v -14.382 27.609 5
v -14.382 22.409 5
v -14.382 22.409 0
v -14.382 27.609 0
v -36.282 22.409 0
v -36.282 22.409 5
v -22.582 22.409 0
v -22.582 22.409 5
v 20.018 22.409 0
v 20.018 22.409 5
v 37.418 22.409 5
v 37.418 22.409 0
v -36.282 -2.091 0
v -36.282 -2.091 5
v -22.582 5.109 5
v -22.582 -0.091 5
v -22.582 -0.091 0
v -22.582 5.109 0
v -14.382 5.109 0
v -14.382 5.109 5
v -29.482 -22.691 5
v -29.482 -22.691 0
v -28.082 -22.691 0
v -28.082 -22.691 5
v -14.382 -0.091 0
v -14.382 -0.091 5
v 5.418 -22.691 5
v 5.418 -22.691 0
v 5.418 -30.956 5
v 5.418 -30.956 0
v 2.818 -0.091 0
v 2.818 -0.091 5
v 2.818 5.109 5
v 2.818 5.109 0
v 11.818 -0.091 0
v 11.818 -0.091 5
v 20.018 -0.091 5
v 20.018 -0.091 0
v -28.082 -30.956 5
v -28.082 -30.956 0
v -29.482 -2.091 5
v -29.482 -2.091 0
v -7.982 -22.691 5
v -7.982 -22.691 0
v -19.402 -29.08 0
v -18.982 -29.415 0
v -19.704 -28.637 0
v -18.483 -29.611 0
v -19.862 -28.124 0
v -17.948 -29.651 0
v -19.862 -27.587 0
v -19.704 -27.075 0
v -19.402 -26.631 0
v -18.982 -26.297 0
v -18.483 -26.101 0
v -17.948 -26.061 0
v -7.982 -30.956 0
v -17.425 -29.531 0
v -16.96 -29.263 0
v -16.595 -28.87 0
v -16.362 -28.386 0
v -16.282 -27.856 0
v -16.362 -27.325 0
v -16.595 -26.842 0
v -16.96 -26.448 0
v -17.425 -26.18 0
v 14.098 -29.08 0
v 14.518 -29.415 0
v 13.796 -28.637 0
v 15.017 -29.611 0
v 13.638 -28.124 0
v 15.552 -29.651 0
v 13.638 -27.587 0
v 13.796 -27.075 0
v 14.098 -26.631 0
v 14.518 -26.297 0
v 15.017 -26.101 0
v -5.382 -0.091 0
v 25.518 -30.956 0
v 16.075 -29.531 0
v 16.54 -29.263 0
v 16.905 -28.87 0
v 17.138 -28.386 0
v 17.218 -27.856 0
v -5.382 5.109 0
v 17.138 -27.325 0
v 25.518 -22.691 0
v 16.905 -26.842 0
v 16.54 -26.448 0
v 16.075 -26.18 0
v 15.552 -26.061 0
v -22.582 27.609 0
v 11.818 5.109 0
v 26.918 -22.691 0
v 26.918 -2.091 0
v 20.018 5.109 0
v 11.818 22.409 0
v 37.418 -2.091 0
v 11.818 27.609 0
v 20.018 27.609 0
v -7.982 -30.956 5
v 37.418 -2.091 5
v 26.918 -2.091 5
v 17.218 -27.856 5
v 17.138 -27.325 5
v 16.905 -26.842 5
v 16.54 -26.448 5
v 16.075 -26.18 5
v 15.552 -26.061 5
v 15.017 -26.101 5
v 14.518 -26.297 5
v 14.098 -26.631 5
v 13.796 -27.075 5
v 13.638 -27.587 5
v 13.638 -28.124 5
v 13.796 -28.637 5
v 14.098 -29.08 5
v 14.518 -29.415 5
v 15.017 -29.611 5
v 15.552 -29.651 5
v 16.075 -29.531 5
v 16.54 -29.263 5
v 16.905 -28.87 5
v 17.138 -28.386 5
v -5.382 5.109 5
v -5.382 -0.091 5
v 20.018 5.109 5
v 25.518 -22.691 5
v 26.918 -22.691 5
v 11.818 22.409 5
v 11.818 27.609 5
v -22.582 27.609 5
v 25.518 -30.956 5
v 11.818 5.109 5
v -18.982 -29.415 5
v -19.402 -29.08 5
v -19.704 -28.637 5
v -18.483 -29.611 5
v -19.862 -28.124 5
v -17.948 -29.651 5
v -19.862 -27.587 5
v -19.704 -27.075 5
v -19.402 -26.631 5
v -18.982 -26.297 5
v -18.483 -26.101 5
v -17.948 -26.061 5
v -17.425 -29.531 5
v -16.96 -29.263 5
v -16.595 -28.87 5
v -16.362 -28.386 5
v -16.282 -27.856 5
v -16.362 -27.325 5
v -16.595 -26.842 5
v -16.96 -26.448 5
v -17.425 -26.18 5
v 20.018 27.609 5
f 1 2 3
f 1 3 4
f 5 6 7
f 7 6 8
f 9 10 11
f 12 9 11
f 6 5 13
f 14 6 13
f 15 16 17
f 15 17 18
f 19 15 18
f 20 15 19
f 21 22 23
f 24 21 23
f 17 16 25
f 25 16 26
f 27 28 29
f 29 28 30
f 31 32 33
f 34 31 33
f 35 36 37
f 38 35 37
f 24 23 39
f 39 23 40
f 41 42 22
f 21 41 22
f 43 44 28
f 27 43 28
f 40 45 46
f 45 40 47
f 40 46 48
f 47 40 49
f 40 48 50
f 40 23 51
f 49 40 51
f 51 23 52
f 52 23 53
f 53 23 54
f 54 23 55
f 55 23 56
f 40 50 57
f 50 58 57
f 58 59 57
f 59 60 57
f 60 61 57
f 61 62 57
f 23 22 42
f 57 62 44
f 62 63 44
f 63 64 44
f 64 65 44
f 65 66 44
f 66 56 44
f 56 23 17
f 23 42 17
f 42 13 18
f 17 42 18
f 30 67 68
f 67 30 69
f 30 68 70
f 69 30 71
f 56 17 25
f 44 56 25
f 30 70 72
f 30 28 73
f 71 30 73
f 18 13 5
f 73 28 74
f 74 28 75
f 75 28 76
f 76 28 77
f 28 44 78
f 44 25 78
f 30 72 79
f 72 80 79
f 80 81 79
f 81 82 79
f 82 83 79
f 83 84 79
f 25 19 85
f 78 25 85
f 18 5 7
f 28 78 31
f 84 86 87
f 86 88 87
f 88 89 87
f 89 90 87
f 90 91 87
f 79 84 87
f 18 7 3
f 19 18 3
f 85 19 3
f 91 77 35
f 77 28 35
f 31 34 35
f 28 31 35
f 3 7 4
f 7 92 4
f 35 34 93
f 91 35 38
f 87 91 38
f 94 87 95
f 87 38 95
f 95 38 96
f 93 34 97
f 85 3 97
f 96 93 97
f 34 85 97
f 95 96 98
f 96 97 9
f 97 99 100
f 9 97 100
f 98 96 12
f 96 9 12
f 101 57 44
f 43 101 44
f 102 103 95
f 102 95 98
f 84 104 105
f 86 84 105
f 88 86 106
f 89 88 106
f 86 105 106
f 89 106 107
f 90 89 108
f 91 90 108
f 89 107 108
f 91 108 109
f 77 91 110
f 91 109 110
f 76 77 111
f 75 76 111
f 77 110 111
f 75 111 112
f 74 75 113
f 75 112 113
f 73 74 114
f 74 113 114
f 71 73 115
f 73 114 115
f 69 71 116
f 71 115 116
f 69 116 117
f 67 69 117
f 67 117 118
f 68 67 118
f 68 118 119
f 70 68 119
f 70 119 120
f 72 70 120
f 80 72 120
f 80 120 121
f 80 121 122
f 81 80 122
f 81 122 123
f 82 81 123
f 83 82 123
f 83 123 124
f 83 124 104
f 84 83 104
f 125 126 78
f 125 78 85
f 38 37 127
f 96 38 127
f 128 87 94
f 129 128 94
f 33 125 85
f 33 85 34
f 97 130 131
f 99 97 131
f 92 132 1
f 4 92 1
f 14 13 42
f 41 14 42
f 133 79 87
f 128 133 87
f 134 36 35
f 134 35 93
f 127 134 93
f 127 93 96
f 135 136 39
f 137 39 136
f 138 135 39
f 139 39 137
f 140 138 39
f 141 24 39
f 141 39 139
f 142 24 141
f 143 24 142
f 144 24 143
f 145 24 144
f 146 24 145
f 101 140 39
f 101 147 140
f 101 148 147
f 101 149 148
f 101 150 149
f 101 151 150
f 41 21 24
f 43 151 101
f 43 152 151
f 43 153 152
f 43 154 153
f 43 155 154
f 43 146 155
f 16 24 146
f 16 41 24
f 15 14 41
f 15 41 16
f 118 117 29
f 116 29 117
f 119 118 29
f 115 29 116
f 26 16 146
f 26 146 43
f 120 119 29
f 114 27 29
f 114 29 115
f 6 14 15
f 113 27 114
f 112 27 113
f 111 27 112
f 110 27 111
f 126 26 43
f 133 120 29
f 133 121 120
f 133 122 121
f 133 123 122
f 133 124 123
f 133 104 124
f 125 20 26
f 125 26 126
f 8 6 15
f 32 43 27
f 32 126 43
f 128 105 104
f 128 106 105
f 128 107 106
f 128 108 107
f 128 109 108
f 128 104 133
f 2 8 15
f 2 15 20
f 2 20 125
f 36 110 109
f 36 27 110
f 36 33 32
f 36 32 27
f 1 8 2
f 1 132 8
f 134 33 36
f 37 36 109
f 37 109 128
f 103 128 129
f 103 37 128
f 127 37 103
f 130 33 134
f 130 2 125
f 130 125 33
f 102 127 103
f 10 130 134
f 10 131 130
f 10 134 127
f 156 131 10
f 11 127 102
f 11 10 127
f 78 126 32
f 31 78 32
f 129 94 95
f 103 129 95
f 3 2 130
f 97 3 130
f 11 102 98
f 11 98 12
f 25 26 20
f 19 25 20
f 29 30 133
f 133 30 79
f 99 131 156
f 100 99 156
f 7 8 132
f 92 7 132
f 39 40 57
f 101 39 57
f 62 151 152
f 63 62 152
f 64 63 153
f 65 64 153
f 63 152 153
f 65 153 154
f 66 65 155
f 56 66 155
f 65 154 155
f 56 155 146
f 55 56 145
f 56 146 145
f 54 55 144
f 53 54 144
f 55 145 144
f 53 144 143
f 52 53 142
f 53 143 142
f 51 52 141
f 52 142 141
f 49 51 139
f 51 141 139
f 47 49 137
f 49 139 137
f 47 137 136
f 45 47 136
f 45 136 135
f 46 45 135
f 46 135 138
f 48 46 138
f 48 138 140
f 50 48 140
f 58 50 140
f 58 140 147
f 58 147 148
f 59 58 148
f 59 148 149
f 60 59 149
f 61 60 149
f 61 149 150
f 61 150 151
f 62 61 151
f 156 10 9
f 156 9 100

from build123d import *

# Parameters (mm, degrees)
BOSS_EXTRUDE1_DEPTH = 5
CUT_EXTRUDE1_REACH  = 7
SKETCH2_R           = 1.8
SKETCH2_W           = 8.2
SKETCH2_H           = 5.2
SKETCH3_W           = 3.7
SKETCH3_H           = 24.5
BOSS_EXTRUDE4_DEPTH = 5
SKETCH4_W           = 8.2
SKETCH4_H           = 5.2
BOSS_EXTRUDE7_DEPTH = 5


with BuildPart() as part:
    # Sketch1 → Boss-Extrude1 (new body)
    with BuildSketch(Plane.XY):
        Polygon((26.917617282, -2.091463415), (33.717617282, -2.091463415), (33.717617282, 22.408536585), (-36.282382718, 22.408536585), (-36.282382718, -2.091463415), (-29.482382718, -2.091463415), (-29.482382718, -22.691463415), (-28.082382718, -22.691463415), (-28.082382718, -30.955691057), (-7.982382718, -30.955691057), (-7.982382718, -22.691463415), (5.417617282, -22.691463415), (5.417617282, -30.955691057), (25.517617282, -30.955691057), (25.517617282, -22.691463415), (26.917617282, -22.691463415), align=None)
    extrude(amount=BOSS_EXTRUDE1_DEPTH)

    # Sketch2 → Cut-Extrude1 (cut, up to next)
    with BuildSketch(Plane.XY.offset(5), mode=Mode.PRIVATE) as cut_extrude1_sk1:
        with Locations((15.417617282, -27.855691057)):
            Circle(SKETCH2_R)
    cut_extrude1_tool1 = extrude(cut_extrude1_sk1.sketch, amount=-CUT_EXTRUDE1_REACH, mode=Mode.PRIVATE) & part.part
    add(cut_extrude1_tool1.solids().sort_by_distance((15.417617, -27.855691, 5))[0], mode=Mode.SUBTRACT)
    # Sketch2 → Cut-Extrude1 (cut, up to next)
    with BuildSketch(Plane.XY.offset(5), mode=Mode.PRIVATE) as cut_extrude1_sk2:
        with Locations((-18.082382718, -27.855691057)):
            Circle(SKETCH2_R)
    cut_extrude1_tool2 = extrude(cut_extrude1_sk2.sketch, amount=-CUT_EXTRUDE1_REACH, mode=Mode.PRIVATE) & part.part
    add(cut_extrude1_tool2.solids().sort_by_distance((-18.082383, -27.855691, 5))[0], mode=Mode.SUBTRACT)
    # Sketch2 → Cut-Extrude1 (cut, up to next)
    with BuildSketch(Plane.XY.offset(5), mode=Mode.PRIVATE) as cut_extrude1_sk3:
        with Locations((-18.482382718, 2.508536585)):
            Rectangle(SKETCH2_W, SKETCH2_H)
    cut_extrude1_tool3 = extrude(cut_extrude1_sk3.sketch, amount=-CUT_EXTRUDE1_REACH, mode=Mode.PRIVATE) & part.part
    add(cut_extrude1_tool3.solids().sort_by_distance((-18.482383, 2.508537, 5))[0], mode=Mode.SUBTRACT)
    # Sketch2 → Cut-Extrude1 (cut, up to next)
    with BuildSketch(Plane.XY.offset(5), mode=Mode.PRIVATE) as cut_extrude1_sk4:
        with Locations((-1.282382718, 2.508536585)):
            Rectangle(SKETCH2_W, SKETCH2_H)
    cut_extrude1_tool4 = extrude(cut_extrude1_sk4.sketch, amount=-CUT_EXTRUDE1_REACH, mode=Mode.PRIVATE) & part.part
    add(cut_extrude1_tool4.solids().sort_by_distance((-1.282383, 2.508537, 5))[0], mode=Mode.SUBTRACT)
    # Sketch2 → Cut-Extrude1 (cut, up to next)
    with BuildSketch(Plane.XY.offset(5), mode=Mode.PRIVATE) as cut_extrude1_sk5:
        with Locations((15.917617282, 2.508536585)):
            Rectangle(SKETCH2_W, SKETCH2_H)
    cut_extrude1_tool5 = extrude(cut_extrude1_sk5.sketch, amount=-CUT_EXTRUDE1_REACH, mode=Mode.PRIVATE) & part.part
    add(cut_extrude1_tool5.solids().sort_by_distance((15.917617, 2.508537, 5))[0], mode=Mode.SUBTRACT)

    # Sketch3 → Boss-Extrude4 (add)
    with BuildSketch(Plane.XY.offset(5)):
        with Locations((35.567617282, 10.158536585)):
            Rectangle(SKETCH3_W, SKETCH3_H)
    extrude(amount=-BOSS_EXTRUDE4_DEPTH)

    # Sketch4 → Boss-Extrude7 (add)
    with BuildSketch(Plane.XY.offset(5)):
        with Locations((-18.482382718, 25.008536585)):
            Rectangle(SKETCH4_W, SKETCH4_H)
        with Locations((15.917617282, 25.008536585)):
            Rectangle(SKETCH4_W, SKETCH4_H)
    extrude(amount=-BOSS_EXTRUDE7_DEPTH)


solid = part.part
